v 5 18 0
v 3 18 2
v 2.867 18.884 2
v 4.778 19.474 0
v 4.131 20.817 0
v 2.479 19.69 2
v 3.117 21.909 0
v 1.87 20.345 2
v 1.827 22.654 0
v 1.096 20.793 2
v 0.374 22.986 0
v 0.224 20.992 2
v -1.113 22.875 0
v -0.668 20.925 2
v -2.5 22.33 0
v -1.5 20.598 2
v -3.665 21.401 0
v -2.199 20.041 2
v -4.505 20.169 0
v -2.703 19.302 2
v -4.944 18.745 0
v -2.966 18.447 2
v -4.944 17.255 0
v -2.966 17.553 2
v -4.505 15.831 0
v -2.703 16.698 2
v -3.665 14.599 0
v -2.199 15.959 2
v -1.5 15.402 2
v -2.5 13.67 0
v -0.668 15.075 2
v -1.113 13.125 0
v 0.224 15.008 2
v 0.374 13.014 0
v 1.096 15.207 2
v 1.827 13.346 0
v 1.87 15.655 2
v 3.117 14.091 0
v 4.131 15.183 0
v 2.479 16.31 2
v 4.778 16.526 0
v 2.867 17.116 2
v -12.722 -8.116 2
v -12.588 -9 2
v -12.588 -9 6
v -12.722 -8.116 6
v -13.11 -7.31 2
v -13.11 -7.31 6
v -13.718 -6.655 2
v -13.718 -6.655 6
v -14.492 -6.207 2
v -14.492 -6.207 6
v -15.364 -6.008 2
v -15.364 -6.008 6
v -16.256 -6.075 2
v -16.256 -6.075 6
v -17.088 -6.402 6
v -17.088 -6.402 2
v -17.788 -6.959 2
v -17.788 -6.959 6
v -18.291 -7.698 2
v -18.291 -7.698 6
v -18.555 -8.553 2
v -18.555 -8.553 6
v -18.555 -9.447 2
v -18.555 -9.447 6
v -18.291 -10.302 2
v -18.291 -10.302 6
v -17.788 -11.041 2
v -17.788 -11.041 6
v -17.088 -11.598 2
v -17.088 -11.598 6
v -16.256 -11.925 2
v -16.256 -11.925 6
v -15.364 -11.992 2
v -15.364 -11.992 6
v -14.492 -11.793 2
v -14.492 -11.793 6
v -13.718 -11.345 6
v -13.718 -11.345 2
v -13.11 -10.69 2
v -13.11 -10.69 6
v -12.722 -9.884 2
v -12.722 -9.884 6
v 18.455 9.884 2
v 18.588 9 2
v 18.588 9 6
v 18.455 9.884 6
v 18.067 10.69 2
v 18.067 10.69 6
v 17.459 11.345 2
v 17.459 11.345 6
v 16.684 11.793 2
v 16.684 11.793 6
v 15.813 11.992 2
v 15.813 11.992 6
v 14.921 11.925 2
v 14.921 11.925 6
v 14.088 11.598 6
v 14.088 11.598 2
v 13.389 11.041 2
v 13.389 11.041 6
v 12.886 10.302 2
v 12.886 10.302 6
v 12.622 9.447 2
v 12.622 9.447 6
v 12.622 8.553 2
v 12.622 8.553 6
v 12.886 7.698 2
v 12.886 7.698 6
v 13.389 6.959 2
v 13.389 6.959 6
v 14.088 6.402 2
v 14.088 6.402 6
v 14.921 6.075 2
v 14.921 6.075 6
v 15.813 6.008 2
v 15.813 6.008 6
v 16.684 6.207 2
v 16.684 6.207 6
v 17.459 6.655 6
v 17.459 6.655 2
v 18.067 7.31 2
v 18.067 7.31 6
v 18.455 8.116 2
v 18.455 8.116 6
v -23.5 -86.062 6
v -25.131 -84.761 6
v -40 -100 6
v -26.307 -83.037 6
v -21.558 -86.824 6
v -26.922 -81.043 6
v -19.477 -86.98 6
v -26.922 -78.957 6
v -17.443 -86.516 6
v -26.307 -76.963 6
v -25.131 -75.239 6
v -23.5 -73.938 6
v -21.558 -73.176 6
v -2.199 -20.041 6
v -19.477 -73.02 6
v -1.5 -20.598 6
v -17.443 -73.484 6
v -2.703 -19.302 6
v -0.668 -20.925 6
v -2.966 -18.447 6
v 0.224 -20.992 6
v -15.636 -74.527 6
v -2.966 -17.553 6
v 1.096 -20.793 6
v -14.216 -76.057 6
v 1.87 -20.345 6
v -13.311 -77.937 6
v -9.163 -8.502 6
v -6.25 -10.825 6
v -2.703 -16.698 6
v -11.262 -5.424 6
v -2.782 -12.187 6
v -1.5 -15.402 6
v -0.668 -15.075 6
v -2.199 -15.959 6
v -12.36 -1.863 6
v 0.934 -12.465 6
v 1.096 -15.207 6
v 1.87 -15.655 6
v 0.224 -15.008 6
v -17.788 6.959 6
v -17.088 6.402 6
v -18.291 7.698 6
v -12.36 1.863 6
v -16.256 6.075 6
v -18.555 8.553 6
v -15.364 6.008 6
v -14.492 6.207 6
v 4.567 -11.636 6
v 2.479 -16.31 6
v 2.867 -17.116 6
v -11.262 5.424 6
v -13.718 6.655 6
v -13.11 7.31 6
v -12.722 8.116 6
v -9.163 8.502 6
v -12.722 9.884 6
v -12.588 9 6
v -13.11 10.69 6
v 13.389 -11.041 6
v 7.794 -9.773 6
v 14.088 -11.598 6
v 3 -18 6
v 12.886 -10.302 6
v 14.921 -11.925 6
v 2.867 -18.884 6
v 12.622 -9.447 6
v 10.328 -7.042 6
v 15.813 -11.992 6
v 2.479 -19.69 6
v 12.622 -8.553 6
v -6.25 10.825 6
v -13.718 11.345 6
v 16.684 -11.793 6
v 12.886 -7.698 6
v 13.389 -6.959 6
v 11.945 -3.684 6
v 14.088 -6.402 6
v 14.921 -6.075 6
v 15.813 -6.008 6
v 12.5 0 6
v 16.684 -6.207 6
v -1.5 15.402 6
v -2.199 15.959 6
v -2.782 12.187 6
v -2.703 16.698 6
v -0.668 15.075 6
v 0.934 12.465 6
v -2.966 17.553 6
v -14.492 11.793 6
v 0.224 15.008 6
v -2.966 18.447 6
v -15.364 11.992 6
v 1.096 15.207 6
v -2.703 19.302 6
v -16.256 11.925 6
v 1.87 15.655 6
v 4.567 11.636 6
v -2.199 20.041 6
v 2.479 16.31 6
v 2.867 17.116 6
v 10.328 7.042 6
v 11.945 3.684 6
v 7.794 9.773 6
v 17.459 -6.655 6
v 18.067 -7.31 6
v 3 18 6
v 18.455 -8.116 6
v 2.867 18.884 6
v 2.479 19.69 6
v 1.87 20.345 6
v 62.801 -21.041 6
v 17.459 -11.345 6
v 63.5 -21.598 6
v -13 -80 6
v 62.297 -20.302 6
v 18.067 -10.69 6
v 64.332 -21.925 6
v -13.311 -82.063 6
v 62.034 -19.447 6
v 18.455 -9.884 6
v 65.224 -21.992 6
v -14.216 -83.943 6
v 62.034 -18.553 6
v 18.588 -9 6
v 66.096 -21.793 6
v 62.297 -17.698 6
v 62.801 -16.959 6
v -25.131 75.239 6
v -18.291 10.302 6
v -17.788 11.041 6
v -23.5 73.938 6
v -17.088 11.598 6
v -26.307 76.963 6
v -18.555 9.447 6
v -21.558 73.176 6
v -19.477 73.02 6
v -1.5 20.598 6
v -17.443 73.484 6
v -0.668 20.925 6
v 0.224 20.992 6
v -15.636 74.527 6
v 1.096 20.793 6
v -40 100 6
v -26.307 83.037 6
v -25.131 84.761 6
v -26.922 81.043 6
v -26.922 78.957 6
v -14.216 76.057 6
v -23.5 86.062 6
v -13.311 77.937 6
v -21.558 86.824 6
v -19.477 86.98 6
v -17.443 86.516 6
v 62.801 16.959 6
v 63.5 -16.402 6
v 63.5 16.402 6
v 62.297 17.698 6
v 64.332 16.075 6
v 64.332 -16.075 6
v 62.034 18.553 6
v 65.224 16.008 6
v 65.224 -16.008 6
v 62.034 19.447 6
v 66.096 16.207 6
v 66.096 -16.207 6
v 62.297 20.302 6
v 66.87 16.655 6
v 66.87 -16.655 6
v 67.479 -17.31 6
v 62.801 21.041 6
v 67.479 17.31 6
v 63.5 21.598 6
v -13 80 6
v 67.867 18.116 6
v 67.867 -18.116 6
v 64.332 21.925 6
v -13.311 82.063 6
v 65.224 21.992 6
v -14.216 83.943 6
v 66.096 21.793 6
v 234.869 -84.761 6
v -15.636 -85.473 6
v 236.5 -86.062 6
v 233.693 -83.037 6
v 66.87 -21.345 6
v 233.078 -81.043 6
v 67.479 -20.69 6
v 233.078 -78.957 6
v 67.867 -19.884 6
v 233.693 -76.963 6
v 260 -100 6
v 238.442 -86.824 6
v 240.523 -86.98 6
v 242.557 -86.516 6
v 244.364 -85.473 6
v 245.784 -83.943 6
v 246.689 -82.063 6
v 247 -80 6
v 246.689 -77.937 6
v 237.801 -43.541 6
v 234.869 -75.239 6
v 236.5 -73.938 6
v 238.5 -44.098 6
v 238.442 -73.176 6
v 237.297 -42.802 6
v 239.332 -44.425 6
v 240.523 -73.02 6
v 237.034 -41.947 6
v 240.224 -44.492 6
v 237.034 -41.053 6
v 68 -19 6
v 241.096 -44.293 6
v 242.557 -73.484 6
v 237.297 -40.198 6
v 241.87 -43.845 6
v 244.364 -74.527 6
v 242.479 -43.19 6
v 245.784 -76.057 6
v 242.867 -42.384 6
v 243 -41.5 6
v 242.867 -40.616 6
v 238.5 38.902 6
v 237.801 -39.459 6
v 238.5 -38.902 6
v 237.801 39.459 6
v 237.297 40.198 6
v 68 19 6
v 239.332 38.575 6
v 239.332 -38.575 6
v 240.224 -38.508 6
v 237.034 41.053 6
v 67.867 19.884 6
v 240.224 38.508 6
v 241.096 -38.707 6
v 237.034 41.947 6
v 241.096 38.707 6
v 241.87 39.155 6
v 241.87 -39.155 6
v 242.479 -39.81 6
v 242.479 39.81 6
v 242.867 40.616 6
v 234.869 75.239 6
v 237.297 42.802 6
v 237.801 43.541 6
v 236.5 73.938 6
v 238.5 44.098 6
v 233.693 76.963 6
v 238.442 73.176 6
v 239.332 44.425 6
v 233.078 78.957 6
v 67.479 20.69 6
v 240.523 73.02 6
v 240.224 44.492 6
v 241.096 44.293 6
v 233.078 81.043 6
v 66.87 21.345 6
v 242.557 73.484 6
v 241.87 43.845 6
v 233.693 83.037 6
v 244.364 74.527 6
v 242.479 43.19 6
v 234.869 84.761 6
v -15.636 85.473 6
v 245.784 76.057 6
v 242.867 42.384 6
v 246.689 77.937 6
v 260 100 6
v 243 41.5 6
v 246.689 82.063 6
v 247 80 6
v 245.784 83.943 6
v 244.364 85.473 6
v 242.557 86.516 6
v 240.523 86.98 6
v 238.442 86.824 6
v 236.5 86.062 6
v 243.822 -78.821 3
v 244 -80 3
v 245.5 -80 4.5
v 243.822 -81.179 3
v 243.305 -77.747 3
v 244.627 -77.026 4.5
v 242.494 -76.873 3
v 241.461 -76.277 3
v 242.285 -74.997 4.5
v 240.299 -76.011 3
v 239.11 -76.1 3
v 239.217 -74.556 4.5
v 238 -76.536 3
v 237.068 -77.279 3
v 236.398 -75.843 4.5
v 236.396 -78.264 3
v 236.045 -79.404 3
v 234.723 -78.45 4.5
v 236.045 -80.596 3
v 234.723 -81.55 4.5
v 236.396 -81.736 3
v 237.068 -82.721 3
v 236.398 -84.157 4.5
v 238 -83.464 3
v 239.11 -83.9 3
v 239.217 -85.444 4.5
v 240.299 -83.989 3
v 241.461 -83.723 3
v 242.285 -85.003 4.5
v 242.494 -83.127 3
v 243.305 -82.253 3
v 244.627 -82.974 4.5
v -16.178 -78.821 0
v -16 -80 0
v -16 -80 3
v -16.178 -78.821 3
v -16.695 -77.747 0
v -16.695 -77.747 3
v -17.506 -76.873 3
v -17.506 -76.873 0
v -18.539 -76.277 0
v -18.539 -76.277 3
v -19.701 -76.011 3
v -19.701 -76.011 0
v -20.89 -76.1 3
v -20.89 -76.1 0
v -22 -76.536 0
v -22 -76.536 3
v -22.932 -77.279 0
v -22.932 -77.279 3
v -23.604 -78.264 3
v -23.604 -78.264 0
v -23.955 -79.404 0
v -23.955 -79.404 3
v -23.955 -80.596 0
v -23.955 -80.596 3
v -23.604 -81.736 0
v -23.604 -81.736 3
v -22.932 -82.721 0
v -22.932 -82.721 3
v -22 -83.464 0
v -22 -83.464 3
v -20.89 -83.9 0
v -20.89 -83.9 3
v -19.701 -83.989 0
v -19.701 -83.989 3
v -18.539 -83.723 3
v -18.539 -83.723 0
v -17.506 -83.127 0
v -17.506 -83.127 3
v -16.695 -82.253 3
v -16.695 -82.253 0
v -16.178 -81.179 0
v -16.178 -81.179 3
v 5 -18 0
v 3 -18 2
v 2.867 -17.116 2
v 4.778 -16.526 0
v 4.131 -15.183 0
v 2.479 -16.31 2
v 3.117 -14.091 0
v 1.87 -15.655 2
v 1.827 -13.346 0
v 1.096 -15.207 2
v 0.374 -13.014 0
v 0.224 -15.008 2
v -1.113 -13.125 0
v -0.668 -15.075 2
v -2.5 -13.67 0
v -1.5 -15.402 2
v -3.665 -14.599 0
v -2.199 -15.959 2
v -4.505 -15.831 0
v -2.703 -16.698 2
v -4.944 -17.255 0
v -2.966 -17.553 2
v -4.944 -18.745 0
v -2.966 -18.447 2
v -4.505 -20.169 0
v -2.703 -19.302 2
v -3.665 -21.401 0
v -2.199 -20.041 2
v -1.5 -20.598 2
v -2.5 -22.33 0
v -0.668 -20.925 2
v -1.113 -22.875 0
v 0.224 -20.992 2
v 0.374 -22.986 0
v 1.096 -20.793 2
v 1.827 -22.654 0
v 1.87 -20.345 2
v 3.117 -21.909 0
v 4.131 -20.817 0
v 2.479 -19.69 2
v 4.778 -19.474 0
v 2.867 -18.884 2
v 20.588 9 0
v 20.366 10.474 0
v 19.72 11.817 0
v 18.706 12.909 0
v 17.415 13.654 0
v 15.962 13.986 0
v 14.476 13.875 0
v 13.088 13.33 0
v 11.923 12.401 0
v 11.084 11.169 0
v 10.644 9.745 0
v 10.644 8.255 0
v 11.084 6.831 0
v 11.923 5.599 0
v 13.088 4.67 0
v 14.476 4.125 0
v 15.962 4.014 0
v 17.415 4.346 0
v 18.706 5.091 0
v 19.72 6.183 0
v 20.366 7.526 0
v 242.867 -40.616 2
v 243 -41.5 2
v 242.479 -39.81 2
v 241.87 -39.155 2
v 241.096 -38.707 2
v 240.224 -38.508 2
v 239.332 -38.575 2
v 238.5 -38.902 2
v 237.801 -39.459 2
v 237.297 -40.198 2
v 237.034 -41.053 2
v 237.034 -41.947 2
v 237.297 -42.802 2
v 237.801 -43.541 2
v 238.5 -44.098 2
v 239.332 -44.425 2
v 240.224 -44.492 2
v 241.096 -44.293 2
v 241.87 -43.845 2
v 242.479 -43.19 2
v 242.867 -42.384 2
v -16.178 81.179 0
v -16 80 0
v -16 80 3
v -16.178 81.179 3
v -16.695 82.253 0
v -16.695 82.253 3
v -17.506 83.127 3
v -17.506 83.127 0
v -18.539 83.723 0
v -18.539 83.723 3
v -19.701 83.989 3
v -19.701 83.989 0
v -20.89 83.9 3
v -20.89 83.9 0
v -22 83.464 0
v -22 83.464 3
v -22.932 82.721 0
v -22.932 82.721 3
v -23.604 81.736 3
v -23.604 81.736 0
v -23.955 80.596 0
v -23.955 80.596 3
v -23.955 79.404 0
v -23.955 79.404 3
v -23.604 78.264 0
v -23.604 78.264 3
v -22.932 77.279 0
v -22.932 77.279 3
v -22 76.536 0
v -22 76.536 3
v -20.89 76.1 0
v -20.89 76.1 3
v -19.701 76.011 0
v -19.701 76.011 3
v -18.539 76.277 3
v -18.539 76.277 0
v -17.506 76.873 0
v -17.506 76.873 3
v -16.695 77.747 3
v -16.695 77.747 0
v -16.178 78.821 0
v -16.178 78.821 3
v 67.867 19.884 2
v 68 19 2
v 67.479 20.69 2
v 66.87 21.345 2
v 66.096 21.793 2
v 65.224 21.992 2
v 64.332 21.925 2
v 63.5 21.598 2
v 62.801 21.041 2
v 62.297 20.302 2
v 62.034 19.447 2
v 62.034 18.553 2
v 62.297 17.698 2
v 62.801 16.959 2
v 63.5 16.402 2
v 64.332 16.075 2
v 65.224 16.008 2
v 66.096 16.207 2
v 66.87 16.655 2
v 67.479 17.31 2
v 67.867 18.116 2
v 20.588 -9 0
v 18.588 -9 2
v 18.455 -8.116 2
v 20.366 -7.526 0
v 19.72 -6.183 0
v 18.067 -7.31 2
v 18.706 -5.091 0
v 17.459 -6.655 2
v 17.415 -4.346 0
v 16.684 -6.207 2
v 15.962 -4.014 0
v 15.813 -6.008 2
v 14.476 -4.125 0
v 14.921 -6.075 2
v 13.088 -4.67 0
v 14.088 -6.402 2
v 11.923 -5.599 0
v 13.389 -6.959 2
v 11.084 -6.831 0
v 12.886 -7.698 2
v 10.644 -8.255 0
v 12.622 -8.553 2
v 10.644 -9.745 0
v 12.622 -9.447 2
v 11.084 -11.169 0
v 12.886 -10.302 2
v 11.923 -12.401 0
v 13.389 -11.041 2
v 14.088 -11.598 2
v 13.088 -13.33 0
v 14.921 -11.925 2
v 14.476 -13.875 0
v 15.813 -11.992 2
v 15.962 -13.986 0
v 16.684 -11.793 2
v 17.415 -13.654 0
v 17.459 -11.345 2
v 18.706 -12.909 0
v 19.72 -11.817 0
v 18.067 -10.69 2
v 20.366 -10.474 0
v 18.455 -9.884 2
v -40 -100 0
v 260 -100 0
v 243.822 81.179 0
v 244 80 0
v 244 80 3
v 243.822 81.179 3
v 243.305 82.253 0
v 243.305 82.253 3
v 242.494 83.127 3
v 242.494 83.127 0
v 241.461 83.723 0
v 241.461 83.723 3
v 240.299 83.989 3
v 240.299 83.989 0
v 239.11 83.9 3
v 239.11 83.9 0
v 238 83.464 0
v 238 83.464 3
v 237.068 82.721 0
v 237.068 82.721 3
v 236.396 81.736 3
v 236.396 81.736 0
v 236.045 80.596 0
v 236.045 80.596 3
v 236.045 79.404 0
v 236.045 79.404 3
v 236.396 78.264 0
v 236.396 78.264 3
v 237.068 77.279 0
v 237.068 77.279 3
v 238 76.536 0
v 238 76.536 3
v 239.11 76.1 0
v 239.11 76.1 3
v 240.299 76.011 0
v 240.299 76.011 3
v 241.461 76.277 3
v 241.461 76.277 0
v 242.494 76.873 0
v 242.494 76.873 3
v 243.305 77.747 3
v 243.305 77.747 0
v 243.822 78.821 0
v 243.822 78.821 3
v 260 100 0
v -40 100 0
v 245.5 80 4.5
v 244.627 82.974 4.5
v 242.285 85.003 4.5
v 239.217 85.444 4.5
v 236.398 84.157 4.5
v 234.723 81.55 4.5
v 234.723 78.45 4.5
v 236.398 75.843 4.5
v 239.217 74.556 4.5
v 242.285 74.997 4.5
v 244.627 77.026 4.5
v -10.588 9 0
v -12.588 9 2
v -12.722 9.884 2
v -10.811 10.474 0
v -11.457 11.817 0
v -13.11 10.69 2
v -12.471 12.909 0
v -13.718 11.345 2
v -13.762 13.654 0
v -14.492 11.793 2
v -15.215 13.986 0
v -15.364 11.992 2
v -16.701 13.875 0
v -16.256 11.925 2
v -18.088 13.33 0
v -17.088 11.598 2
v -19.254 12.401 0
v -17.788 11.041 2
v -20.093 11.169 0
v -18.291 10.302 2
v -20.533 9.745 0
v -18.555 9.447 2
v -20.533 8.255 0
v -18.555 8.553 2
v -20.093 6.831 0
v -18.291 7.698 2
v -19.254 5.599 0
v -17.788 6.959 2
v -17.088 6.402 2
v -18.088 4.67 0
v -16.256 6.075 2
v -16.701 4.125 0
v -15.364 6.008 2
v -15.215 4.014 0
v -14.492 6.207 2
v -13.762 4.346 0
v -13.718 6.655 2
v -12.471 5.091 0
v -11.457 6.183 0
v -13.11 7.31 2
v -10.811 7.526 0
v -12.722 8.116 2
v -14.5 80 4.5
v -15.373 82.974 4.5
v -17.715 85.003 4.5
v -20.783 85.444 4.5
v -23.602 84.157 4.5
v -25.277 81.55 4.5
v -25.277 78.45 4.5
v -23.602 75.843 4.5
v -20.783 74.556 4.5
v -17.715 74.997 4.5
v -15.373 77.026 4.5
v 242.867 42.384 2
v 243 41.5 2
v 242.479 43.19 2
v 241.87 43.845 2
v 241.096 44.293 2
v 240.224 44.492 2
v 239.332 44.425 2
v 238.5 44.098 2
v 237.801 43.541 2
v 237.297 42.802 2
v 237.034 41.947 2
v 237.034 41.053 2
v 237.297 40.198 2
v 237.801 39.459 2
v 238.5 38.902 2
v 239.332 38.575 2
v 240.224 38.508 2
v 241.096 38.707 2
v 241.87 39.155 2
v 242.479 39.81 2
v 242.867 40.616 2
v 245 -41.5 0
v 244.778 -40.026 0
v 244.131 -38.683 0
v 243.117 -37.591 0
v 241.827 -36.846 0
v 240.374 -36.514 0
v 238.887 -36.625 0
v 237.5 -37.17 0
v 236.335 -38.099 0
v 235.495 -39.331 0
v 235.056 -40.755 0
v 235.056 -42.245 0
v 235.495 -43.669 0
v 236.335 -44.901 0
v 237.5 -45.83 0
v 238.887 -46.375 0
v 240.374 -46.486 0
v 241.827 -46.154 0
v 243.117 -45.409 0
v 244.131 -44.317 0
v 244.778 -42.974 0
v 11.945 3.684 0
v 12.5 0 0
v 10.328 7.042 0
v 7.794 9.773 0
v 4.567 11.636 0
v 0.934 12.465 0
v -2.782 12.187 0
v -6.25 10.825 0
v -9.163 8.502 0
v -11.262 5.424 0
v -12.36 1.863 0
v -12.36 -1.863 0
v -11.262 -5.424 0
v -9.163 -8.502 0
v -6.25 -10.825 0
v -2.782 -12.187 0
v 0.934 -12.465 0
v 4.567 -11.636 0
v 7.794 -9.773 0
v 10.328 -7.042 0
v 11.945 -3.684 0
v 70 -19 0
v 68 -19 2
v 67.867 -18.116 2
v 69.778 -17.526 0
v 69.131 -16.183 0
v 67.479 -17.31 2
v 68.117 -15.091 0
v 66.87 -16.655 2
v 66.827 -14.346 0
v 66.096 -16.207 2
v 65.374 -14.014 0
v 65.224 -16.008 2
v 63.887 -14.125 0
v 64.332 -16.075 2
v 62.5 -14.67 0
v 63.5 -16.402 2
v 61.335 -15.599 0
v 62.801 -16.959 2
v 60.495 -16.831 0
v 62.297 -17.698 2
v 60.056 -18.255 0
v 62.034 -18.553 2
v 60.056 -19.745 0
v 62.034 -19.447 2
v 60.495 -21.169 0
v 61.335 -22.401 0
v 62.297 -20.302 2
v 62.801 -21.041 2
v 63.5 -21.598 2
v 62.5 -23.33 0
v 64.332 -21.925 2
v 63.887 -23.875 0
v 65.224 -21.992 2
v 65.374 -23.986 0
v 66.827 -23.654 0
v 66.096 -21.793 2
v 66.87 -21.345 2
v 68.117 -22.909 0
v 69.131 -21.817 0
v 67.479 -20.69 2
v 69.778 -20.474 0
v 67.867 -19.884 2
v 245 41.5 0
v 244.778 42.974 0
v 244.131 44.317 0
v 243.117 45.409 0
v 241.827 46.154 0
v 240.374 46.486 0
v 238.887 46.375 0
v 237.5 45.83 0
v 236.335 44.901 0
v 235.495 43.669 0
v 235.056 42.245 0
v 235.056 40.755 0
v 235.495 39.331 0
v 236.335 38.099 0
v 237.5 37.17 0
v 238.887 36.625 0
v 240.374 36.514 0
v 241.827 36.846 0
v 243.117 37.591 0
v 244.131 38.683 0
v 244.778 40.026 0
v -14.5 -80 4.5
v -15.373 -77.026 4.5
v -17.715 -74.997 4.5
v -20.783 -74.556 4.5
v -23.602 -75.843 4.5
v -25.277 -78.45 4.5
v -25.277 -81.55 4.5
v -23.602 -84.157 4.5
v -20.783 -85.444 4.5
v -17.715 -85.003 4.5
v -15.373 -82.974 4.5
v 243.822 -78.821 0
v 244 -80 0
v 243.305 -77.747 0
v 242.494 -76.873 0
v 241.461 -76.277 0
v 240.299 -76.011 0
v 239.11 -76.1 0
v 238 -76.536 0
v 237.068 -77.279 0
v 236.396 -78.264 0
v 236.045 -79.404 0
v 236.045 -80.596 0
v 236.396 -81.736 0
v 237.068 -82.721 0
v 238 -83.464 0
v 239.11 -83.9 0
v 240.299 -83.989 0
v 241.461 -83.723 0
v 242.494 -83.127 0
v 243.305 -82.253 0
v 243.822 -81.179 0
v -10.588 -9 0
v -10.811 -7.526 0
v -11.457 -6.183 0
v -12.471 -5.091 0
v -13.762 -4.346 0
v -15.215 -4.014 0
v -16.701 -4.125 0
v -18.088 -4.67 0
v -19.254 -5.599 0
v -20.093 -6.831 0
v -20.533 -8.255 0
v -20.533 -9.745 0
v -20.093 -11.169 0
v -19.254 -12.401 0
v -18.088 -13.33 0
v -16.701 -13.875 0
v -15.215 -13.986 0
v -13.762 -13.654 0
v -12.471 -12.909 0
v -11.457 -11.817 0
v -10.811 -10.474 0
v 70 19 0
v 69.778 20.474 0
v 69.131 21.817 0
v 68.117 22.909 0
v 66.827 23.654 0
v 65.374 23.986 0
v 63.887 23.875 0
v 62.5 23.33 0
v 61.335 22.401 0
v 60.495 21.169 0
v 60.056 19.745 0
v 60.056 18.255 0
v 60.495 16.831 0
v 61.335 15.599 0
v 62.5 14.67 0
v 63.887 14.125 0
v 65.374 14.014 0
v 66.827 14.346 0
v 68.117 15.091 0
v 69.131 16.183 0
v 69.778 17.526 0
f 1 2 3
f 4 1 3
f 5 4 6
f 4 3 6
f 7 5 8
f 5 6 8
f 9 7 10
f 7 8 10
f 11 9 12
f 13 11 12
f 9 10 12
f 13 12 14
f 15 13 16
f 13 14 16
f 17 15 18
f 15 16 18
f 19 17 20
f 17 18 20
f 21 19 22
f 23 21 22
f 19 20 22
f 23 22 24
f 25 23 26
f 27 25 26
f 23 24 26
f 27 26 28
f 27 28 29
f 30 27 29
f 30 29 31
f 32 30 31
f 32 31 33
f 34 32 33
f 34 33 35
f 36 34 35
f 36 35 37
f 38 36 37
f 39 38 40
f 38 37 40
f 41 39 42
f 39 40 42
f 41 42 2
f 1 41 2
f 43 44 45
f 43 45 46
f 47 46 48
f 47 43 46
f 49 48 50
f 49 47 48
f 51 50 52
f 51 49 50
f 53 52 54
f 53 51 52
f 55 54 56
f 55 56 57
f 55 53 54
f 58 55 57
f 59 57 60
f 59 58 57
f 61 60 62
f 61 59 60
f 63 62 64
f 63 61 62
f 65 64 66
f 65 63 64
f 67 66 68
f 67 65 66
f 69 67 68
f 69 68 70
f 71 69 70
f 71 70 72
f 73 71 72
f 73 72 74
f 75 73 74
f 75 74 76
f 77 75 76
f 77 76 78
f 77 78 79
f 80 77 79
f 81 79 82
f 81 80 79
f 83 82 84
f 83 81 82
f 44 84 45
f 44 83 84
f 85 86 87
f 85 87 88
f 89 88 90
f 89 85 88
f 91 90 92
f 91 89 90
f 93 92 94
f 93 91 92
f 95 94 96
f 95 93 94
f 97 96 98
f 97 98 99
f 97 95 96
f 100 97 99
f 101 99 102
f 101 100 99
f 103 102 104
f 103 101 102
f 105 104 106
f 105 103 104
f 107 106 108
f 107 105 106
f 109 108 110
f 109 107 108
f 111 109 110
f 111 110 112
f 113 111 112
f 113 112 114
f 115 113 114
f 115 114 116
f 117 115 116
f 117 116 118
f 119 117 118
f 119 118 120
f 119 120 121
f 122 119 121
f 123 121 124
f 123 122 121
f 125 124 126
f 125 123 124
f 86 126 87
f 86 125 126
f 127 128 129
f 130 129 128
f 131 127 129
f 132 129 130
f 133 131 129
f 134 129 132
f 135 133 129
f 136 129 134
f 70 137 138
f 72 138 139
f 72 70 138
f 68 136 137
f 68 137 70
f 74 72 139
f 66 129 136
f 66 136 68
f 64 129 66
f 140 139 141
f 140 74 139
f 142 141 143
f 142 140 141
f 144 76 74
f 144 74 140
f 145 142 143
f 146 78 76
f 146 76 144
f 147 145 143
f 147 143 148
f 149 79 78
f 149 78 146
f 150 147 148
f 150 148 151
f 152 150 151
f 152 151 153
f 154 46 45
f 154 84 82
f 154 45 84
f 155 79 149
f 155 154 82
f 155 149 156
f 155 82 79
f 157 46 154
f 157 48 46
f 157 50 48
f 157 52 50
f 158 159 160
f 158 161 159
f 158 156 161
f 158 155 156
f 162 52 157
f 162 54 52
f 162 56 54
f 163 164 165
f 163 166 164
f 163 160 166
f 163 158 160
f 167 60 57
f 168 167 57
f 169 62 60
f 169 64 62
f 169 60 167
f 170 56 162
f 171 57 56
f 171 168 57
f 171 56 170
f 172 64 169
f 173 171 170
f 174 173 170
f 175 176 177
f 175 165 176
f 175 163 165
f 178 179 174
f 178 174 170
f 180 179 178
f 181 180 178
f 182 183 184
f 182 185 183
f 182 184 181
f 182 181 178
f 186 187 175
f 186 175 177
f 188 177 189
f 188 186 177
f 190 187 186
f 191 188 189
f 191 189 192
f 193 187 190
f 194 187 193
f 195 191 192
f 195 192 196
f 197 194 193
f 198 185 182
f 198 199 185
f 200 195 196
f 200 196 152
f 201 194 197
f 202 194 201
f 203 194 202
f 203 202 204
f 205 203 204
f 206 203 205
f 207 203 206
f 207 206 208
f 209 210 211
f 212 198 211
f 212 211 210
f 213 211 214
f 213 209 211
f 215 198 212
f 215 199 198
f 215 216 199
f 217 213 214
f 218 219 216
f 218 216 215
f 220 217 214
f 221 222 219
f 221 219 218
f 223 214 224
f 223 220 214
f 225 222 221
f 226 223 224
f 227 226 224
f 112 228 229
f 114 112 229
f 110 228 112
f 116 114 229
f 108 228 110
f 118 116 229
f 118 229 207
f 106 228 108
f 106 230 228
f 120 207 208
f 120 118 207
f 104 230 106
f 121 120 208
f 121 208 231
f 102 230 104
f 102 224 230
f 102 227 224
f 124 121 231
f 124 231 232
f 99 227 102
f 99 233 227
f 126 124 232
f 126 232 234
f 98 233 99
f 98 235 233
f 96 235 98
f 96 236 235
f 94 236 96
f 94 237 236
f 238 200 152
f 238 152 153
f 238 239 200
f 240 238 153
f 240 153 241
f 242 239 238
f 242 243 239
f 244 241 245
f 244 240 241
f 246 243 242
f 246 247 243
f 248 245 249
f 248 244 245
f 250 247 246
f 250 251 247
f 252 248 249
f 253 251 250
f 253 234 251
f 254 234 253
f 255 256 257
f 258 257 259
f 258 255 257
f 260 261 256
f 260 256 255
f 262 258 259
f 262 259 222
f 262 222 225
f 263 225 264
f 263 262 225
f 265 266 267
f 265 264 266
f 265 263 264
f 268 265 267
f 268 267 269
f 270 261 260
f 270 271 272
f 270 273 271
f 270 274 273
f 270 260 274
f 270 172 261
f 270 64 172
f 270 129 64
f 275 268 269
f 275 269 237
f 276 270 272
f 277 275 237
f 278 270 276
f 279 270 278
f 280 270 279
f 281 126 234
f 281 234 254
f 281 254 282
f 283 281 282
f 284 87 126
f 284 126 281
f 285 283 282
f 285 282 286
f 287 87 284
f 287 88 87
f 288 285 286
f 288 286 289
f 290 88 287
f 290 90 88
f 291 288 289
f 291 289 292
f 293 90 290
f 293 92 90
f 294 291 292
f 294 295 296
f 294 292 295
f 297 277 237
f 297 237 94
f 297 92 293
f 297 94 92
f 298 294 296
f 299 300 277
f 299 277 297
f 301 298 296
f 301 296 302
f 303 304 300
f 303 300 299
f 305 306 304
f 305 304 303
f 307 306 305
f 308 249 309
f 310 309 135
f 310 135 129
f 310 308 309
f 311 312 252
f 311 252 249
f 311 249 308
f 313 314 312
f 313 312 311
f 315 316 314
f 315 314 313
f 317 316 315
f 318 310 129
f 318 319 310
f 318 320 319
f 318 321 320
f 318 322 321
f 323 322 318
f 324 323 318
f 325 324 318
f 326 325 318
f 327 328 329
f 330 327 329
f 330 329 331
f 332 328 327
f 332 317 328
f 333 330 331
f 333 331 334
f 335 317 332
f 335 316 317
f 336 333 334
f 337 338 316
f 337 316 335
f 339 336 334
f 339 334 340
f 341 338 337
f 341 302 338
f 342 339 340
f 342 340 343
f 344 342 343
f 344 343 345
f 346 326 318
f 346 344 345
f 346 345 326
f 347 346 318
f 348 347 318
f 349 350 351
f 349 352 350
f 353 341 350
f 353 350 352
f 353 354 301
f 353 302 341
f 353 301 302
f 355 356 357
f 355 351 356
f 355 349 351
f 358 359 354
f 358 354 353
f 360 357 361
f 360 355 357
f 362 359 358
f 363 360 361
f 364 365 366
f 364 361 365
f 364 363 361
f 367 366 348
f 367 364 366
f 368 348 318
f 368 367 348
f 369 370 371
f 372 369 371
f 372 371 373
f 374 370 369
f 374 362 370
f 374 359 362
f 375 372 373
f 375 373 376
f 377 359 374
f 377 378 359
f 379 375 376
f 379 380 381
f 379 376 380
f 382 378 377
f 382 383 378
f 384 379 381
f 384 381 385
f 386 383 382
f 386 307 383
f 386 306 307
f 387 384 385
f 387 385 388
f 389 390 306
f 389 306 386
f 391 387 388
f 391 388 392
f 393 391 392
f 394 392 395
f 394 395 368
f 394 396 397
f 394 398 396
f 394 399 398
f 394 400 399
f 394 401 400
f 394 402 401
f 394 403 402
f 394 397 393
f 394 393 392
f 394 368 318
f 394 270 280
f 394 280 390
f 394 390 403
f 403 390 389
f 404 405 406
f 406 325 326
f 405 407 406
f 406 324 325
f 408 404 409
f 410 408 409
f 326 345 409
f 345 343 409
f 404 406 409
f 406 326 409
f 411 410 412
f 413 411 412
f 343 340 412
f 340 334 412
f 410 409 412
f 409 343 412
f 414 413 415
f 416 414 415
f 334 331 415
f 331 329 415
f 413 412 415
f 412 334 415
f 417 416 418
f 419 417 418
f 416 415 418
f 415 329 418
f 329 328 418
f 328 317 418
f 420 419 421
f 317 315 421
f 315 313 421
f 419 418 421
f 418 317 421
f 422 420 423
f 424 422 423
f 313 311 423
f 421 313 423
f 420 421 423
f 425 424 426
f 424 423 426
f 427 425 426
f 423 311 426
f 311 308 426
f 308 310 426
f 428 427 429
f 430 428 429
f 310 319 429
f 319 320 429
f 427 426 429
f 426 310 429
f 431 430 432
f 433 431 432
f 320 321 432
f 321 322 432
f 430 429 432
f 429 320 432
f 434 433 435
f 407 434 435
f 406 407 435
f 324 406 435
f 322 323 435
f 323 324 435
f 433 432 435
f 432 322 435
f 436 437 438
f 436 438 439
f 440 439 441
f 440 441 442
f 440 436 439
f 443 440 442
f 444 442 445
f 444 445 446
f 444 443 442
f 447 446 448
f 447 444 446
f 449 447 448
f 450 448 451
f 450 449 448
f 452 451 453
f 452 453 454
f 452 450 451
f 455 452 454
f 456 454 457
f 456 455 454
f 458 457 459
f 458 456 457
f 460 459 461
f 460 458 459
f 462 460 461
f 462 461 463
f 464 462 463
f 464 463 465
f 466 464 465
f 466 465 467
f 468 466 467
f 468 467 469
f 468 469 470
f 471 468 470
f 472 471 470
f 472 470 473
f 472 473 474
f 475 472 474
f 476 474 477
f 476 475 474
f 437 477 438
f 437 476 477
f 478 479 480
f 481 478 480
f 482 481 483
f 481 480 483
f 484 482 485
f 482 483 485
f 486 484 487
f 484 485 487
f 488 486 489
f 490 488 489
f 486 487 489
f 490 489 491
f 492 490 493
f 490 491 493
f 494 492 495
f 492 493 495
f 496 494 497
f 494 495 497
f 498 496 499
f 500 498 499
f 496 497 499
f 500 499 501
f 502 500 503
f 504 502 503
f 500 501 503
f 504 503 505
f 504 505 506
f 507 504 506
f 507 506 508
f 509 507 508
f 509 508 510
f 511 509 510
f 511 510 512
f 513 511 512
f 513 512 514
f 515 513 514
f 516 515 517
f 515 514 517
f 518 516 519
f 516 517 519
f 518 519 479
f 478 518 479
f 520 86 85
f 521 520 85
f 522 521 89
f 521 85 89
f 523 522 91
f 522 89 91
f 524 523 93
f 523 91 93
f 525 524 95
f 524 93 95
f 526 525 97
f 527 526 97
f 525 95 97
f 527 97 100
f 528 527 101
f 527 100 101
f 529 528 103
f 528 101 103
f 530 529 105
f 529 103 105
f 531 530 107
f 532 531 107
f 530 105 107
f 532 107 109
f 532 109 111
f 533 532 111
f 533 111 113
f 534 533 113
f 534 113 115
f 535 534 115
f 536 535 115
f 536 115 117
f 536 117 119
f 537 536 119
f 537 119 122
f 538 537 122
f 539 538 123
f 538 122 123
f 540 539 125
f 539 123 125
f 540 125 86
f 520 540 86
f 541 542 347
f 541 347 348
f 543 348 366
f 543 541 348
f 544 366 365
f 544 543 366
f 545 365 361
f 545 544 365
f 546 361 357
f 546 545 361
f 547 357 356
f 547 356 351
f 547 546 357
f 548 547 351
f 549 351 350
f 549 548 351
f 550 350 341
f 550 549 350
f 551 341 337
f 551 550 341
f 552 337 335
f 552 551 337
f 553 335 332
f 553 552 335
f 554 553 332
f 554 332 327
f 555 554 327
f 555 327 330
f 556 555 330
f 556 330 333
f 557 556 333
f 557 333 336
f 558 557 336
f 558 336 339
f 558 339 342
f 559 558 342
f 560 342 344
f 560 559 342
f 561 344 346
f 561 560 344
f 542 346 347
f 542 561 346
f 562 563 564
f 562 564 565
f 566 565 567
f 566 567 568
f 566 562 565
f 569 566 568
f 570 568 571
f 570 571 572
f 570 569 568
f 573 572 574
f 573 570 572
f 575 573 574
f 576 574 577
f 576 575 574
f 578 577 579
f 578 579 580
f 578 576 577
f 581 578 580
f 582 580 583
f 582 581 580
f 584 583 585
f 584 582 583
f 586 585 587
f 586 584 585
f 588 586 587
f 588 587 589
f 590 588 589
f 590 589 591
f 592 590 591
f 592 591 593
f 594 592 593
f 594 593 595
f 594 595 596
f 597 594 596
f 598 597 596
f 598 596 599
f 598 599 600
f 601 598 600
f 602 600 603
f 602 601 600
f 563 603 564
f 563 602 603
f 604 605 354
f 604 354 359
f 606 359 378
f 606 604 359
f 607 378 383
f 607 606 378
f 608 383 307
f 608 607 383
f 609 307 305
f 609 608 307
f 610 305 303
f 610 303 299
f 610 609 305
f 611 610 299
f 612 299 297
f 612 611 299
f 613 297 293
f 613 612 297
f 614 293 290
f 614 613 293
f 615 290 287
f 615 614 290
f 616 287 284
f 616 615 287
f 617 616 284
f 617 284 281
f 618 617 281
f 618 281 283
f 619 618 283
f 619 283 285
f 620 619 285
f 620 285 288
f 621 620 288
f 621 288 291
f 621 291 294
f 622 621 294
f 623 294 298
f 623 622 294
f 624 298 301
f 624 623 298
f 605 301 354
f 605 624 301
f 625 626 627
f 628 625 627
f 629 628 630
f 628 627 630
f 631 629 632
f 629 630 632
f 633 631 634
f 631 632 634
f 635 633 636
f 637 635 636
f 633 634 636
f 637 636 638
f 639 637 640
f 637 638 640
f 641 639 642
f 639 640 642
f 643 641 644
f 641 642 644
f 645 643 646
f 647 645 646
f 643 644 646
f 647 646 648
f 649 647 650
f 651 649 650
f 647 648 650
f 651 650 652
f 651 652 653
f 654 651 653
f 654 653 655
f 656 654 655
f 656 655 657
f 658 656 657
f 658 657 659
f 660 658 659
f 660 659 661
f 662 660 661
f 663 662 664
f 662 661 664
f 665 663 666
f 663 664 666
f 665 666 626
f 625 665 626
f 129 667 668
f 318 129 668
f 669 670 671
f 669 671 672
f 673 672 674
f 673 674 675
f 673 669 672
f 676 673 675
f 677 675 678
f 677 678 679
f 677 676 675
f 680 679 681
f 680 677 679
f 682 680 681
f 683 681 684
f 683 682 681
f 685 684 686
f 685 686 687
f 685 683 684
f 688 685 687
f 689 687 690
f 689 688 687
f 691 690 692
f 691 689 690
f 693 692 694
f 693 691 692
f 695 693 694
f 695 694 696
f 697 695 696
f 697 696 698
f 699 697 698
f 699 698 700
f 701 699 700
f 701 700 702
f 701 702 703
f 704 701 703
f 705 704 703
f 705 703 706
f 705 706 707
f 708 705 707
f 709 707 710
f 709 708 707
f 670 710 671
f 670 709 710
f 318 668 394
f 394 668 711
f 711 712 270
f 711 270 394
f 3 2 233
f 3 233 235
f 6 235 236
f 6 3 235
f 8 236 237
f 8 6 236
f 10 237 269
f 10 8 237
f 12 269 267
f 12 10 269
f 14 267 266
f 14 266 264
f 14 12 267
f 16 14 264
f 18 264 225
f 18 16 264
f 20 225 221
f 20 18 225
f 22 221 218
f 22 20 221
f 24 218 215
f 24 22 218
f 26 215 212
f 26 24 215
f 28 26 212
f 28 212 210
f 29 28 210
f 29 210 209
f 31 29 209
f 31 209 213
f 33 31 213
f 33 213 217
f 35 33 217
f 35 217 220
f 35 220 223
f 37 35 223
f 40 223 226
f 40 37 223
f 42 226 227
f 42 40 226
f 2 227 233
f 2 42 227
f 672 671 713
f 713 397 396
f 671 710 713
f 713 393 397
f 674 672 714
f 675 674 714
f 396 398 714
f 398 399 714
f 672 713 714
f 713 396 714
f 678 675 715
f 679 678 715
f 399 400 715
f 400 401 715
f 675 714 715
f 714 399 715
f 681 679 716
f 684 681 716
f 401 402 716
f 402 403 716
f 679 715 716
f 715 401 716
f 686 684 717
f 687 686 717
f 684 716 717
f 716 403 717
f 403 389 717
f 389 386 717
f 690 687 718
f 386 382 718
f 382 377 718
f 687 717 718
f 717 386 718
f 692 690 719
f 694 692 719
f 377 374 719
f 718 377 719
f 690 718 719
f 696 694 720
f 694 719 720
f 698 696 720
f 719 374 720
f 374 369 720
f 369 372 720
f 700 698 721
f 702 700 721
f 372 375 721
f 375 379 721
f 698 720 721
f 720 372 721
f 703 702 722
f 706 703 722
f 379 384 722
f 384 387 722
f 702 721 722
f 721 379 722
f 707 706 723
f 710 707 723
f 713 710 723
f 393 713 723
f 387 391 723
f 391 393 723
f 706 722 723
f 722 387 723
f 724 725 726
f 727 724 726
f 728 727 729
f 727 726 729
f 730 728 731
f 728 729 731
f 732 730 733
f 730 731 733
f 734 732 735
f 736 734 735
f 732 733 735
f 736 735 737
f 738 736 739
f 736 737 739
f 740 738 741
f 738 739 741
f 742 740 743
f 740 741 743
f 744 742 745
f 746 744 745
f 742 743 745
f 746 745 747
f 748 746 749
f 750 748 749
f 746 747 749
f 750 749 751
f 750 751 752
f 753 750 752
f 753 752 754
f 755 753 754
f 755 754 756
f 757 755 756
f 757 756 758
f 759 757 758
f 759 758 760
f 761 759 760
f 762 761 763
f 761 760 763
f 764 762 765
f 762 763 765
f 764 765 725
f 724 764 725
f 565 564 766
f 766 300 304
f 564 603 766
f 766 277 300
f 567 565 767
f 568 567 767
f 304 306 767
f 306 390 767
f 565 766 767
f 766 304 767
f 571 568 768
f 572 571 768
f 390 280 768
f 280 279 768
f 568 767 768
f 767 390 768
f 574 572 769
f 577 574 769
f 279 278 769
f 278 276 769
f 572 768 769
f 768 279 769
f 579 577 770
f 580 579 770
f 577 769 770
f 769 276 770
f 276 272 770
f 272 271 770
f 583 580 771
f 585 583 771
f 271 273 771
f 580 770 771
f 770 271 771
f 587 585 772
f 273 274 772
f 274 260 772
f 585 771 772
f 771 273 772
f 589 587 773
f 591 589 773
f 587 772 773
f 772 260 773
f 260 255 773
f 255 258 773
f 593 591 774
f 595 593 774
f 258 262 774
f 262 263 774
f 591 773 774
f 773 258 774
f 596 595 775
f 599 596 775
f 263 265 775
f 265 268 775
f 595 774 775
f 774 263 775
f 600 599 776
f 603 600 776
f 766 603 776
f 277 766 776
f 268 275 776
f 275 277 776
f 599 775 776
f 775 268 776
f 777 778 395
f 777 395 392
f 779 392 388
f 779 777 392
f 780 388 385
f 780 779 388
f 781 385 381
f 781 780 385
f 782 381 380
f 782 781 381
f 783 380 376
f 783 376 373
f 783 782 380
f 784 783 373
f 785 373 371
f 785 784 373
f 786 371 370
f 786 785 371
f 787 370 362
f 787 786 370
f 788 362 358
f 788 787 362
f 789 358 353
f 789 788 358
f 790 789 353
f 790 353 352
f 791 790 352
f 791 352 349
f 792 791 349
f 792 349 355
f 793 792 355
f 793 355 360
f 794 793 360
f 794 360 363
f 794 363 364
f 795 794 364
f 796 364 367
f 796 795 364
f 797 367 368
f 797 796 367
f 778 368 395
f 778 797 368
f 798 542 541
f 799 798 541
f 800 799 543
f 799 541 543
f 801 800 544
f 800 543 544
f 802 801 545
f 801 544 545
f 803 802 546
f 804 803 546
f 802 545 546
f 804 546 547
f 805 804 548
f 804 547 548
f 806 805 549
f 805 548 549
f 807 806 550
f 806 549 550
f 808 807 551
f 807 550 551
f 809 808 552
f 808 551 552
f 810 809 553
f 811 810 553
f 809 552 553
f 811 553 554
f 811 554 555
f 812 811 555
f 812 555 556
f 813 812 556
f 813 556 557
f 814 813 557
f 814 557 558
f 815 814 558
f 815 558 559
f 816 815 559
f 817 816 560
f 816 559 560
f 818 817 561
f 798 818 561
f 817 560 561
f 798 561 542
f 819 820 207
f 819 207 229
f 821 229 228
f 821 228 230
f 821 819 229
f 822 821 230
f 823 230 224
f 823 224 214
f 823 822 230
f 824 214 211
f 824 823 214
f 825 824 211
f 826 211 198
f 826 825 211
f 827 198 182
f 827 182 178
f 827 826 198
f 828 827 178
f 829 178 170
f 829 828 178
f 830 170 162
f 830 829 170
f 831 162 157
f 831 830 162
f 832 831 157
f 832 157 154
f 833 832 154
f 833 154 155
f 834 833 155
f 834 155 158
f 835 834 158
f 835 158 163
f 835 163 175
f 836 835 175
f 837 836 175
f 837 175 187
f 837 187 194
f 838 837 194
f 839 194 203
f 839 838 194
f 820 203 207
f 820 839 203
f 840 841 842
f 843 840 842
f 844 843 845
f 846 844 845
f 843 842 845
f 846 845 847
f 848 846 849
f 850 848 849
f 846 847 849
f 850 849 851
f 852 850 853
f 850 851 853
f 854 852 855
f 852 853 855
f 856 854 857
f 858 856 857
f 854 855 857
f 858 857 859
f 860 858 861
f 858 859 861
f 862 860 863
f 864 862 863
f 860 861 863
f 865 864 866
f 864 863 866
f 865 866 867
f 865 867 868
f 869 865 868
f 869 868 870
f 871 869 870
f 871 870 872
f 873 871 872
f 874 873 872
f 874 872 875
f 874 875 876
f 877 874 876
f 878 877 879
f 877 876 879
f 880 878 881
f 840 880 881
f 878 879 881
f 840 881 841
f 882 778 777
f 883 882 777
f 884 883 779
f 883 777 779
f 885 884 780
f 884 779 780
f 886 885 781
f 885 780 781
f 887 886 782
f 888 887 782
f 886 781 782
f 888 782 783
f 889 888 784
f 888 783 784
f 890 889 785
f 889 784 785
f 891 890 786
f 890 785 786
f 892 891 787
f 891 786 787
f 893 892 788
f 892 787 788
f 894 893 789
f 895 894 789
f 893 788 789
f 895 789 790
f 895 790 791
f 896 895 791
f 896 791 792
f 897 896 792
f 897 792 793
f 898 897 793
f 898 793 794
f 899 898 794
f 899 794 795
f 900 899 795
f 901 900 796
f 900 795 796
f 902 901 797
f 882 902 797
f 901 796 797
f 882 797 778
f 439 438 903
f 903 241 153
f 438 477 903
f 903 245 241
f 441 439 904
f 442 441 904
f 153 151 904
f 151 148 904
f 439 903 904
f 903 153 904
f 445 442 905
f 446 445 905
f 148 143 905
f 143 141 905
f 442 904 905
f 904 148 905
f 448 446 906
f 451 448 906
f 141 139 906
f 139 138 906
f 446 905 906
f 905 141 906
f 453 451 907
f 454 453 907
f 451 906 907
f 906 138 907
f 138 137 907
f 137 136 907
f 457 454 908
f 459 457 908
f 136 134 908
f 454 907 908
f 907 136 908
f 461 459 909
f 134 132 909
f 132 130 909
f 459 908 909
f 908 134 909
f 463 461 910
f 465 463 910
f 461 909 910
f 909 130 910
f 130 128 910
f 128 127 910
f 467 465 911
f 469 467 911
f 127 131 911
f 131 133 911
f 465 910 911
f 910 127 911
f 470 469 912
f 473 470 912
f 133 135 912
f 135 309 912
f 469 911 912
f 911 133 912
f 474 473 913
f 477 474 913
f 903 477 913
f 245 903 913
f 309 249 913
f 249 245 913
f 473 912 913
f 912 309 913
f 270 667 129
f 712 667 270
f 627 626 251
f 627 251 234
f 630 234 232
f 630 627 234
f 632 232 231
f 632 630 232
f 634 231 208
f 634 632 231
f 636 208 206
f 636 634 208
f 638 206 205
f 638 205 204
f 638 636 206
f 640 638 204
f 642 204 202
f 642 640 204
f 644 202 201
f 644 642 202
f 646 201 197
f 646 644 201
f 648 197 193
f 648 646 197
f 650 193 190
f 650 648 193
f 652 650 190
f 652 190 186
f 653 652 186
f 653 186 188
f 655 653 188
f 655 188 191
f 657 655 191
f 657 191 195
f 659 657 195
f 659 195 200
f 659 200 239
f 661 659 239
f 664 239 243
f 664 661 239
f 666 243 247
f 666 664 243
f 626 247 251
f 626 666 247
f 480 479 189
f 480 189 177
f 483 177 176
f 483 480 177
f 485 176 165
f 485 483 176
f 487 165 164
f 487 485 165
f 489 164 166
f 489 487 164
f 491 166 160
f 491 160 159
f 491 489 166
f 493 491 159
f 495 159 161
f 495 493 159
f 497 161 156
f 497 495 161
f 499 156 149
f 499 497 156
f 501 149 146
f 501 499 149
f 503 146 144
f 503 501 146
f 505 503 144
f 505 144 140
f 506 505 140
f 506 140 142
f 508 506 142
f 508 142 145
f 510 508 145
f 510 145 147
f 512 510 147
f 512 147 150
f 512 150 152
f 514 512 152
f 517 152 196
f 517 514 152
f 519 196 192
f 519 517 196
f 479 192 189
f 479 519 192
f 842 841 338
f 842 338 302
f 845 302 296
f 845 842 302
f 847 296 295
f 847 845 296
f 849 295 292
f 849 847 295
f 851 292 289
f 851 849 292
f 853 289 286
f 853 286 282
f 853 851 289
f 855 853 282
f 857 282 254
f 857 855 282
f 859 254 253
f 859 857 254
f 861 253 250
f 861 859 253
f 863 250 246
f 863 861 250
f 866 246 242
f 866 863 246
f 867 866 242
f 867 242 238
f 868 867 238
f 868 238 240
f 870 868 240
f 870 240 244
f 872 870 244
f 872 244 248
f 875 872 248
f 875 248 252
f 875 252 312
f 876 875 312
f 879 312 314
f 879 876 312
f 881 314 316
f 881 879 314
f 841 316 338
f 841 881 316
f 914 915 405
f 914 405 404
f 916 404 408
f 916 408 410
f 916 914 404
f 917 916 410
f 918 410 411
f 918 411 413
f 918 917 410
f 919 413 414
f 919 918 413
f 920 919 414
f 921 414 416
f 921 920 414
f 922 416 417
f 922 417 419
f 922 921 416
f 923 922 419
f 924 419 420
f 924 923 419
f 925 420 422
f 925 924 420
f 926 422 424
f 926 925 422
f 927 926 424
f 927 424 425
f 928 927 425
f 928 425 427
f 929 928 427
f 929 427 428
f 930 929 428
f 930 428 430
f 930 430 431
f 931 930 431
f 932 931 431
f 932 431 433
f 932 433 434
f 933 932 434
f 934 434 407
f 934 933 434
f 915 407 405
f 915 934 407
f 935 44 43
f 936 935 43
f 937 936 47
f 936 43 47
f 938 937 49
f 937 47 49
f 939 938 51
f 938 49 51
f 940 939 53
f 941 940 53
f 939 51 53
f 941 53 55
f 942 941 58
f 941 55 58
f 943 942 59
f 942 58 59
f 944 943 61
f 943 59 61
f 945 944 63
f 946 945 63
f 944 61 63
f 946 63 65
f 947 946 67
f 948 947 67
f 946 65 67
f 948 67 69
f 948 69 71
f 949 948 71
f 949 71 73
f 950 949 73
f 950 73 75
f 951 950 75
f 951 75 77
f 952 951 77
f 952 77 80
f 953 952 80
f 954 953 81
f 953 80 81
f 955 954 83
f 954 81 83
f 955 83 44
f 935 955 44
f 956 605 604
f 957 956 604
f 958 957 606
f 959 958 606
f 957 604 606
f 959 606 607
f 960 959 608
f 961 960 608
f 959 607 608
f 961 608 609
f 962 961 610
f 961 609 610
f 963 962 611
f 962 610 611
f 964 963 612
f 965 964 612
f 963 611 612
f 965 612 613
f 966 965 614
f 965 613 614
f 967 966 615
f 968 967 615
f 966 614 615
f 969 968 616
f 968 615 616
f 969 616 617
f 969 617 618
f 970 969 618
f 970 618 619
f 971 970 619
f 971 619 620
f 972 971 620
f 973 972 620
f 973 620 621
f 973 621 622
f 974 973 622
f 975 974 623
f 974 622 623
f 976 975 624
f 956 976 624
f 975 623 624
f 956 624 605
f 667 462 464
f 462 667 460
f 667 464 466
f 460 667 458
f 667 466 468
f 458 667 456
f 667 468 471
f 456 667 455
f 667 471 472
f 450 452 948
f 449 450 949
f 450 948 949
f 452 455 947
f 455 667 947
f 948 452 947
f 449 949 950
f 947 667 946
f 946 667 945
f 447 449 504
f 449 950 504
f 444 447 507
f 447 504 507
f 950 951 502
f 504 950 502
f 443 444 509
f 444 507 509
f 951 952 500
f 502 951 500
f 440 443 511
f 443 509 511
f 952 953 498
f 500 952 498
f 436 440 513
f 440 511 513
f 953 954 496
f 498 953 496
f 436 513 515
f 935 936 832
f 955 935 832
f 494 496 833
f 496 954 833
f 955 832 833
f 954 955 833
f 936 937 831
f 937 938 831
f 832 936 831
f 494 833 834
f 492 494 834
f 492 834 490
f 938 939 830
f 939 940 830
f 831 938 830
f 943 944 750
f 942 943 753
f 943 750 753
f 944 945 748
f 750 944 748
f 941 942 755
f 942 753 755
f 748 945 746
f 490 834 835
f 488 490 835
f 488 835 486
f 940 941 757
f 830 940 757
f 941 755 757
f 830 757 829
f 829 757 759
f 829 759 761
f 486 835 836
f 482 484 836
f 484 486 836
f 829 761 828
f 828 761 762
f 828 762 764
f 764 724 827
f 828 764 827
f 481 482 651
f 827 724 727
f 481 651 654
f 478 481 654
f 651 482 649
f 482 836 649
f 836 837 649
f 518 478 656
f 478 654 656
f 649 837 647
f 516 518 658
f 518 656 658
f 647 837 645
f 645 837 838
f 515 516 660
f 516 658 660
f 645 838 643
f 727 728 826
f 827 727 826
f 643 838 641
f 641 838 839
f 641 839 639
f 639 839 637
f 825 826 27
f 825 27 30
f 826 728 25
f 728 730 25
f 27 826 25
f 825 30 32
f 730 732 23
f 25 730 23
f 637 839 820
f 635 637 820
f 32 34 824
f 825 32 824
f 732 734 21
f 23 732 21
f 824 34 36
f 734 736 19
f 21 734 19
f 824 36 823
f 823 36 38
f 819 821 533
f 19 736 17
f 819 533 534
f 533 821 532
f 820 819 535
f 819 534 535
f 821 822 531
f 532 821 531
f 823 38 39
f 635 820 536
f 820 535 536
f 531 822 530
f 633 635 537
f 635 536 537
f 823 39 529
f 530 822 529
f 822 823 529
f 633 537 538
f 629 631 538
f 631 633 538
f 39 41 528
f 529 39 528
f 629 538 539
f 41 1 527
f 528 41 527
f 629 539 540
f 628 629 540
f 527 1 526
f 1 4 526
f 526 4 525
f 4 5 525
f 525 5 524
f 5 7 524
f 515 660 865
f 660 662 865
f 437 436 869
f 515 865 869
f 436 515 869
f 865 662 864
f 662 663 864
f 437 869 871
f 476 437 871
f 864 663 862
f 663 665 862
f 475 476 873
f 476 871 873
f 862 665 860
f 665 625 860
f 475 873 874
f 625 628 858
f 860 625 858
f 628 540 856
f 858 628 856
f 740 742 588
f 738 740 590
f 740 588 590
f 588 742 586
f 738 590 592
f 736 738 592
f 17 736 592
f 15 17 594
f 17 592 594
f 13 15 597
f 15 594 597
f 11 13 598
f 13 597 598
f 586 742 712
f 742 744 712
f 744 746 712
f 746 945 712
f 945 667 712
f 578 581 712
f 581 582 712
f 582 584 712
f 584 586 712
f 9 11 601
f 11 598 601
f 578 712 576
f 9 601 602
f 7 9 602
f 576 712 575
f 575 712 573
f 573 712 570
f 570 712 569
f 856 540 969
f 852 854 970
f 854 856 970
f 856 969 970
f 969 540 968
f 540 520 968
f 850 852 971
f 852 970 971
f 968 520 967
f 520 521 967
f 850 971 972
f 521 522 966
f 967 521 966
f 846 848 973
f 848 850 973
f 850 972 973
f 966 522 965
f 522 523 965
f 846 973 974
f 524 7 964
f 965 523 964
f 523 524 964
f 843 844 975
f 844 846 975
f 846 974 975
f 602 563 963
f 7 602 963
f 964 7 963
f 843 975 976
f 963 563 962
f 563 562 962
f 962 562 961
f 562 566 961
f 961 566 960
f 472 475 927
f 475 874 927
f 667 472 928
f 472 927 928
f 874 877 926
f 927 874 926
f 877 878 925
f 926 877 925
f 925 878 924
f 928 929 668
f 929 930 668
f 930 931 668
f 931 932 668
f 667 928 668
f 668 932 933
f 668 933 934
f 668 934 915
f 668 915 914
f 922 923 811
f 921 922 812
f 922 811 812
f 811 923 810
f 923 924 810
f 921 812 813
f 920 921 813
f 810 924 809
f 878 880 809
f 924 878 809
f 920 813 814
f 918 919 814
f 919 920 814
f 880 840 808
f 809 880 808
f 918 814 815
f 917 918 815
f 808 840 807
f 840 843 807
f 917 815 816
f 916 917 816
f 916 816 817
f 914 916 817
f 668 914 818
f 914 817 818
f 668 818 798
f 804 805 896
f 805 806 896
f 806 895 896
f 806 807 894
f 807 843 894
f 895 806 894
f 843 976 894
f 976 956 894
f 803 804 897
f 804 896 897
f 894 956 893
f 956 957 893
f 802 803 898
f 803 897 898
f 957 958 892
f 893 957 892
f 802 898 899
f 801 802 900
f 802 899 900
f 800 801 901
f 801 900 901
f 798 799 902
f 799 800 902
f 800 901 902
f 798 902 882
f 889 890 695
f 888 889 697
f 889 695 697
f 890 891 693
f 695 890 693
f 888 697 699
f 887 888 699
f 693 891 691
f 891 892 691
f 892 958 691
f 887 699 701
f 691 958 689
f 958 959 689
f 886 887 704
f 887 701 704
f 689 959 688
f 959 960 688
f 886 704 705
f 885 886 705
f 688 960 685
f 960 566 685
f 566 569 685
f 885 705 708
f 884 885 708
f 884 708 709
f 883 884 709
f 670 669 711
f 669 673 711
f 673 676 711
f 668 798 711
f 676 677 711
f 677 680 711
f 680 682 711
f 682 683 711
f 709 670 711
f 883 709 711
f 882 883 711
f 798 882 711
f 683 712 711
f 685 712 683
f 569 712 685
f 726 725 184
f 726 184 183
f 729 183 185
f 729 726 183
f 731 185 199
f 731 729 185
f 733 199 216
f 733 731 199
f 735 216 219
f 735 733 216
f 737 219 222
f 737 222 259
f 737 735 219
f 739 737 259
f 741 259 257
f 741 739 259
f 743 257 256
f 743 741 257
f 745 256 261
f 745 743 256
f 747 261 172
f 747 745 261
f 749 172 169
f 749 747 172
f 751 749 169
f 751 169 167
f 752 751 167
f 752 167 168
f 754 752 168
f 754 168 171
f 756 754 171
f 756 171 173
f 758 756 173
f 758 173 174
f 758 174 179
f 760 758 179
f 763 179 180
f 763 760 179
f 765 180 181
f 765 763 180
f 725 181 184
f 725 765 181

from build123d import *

# Parameters (mm, degrees)
F0_W     = 300
F0_H     = 200
F0_R     = 4
F0_R_2   = 3
F0_R_3   = 12.5
F1_DEPTH = 6
F2_SIZE  = 3
F3_SIZE  = 2


with BuildPart() as f1:
    # F0 (on Top) → F1 (new body)
    with BuildSketch(Plane.XY):
        with Locations((110, 0)):
            Rectangle(F0_W, F0_H)
        with Locations((-20, -80)):
            Circle(F0_R, mode=Mode.SUBTRACT)
        with Locations((-15.588457, -9)):
            Circle(F0_R_2, mode=Mode.SUBTRACT)
        with Locations((0, -18)):
            Circle(F0_R_2, mode=Mode.SUBTRACT)
        with Locations((15.588457, -9)):
            Circle(F0_R_2, mode=Mode.SUBTRACT)
        with Locations((65, -19)):
            Circle(F0_R_2, mode=Mode.SUBTRACT)
        with Locations((240, -80)):
            Circle(F0_R, mode=Mode.SUBTRACT)
        with Locations((240, -41.5)):
            Circle(F0_R_2, mode=Mode.SUBTRACT)
        with Locations((-15.588457, 9)):
            Circle(F0_R_2, mode=Mode.SUBTRACT)
        Circle(F0_R_3, mode=Mode.SUBTRACT)
        with Locations((15.588457, 9)):
            Circle(F0_R_2, mode=Mode.SUBTRACT)
        with Locations((0, 18)):
            Circle(F0_R_2, mode=Mode.SUBTRACT)
        with Locations((65, 19)):
            Circle(F0_R_2, mode=Mode.SUBTRACT)
        with Locations((-20, 80)):
            Circle(F0_R, mode=Mode.SUBTRACT)
        with Locations((240, 41.5)):
            Circle(F0_R_2, mode=Mode.SUBTRACT)
        with Locations((240, 80)):
            Circle(F0_R, mode=Mode.SUBTRACT)
    extrude(amount=F1_DEPTH)

    # F2
    f2_edges = [f1.edges().sort_by_distance(p)[0] for p in [
        (-24, 80, 6),
        (236, 80, 6),
        (236, -80, 6),
        (-24, -80, 6),
    ]]
    chamfer(f2_edges, length=F2_SIZE)

    # F3
    f3_edges = [f1.edges().sort_by_distance(p)[0] for p in [
        (62, -19, 0),
        (237, -41.5, 0),
        (237, 41.5, 0),
        (62, 19, 0),
        (-3, -18, 0),
        (-18.588457, -9, 0),
        (-18.588457, 9, 0),
        (12.588457, -9, 0),
        (12.588457, 9, 0),
        (-3, 18, 0),
    ]]
    chamfer(f3_edges, length=F3_SIZE)


solid = f1.part
